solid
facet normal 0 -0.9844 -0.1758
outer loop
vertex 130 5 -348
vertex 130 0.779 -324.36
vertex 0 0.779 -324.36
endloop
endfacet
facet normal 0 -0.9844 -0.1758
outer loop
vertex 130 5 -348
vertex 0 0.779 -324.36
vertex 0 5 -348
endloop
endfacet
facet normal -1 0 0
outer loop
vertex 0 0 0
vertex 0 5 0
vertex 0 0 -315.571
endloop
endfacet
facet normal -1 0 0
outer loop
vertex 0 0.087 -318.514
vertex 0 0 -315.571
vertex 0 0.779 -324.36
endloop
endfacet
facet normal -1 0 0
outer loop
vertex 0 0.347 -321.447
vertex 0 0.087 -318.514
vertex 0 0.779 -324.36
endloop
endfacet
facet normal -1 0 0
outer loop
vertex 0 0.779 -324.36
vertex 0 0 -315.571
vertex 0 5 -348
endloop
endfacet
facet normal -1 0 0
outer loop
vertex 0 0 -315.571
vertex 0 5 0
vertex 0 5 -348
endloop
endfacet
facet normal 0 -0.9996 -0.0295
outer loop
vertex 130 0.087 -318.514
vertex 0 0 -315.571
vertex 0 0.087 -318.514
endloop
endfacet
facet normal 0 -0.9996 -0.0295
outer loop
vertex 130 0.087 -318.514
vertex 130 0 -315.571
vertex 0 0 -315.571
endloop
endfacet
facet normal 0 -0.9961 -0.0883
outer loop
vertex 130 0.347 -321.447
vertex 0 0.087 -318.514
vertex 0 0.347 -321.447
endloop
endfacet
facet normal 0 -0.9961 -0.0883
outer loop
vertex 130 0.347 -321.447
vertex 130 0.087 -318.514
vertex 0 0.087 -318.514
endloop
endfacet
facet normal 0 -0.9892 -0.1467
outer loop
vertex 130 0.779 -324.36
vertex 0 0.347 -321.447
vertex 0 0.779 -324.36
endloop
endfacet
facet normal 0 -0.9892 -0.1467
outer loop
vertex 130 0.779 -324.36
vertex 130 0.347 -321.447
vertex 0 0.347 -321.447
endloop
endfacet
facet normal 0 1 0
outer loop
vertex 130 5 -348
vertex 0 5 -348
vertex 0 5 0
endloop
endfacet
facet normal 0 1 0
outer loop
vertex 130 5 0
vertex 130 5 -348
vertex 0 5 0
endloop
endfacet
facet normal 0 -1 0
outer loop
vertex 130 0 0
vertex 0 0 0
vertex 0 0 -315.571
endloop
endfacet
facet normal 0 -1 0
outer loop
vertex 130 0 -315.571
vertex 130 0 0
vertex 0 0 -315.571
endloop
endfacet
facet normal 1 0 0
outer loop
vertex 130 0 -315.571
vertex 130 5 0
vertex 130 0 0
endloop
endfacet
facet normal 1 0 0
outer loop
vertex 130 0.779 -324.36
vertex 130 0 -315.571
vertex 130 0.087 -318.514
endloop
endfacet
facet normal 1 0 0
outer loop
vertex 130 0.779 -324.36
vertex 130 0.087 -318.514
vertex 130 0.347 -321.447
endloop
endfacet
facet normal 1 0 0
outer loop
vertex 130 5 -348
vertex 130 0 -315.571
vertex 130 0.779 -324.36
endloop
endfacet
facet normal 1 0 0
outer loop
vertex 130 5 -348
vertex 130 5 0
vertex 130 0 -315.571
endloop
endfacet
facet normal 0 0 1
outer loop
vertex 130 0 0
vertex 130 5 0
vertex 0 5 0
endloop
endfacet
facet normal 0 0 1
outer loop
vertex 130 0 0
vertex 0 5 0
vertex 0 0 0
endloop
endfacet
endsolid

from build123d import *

# Parameters (mm, degrees)
BOSS_EXTRUDE1_DEPTH = 130
FILLET1_R           = 50


with BuildPart() as part:
    # Sketch1 → Boss-Extrude1 (new body)
    with BuildSketch(Plane(origin=(0, 0, 0), x_dir=(0, 0, -1), z_dir=(1, 0, 0))):
        Polygon((0, 5), (0, 0), (320, 0), (348, 5), align=None)
    extrude(amount=BOSS_EXTRUDE1_DEPTH)

    # Fillet1
    fillet1_edges = [part.edges().sort_by_distance(p)[0] for p in [
        (65, 0, -320),
    ]]
    fillet(fillet1_edges, radius=FILLET1_R)


solid = part.part
